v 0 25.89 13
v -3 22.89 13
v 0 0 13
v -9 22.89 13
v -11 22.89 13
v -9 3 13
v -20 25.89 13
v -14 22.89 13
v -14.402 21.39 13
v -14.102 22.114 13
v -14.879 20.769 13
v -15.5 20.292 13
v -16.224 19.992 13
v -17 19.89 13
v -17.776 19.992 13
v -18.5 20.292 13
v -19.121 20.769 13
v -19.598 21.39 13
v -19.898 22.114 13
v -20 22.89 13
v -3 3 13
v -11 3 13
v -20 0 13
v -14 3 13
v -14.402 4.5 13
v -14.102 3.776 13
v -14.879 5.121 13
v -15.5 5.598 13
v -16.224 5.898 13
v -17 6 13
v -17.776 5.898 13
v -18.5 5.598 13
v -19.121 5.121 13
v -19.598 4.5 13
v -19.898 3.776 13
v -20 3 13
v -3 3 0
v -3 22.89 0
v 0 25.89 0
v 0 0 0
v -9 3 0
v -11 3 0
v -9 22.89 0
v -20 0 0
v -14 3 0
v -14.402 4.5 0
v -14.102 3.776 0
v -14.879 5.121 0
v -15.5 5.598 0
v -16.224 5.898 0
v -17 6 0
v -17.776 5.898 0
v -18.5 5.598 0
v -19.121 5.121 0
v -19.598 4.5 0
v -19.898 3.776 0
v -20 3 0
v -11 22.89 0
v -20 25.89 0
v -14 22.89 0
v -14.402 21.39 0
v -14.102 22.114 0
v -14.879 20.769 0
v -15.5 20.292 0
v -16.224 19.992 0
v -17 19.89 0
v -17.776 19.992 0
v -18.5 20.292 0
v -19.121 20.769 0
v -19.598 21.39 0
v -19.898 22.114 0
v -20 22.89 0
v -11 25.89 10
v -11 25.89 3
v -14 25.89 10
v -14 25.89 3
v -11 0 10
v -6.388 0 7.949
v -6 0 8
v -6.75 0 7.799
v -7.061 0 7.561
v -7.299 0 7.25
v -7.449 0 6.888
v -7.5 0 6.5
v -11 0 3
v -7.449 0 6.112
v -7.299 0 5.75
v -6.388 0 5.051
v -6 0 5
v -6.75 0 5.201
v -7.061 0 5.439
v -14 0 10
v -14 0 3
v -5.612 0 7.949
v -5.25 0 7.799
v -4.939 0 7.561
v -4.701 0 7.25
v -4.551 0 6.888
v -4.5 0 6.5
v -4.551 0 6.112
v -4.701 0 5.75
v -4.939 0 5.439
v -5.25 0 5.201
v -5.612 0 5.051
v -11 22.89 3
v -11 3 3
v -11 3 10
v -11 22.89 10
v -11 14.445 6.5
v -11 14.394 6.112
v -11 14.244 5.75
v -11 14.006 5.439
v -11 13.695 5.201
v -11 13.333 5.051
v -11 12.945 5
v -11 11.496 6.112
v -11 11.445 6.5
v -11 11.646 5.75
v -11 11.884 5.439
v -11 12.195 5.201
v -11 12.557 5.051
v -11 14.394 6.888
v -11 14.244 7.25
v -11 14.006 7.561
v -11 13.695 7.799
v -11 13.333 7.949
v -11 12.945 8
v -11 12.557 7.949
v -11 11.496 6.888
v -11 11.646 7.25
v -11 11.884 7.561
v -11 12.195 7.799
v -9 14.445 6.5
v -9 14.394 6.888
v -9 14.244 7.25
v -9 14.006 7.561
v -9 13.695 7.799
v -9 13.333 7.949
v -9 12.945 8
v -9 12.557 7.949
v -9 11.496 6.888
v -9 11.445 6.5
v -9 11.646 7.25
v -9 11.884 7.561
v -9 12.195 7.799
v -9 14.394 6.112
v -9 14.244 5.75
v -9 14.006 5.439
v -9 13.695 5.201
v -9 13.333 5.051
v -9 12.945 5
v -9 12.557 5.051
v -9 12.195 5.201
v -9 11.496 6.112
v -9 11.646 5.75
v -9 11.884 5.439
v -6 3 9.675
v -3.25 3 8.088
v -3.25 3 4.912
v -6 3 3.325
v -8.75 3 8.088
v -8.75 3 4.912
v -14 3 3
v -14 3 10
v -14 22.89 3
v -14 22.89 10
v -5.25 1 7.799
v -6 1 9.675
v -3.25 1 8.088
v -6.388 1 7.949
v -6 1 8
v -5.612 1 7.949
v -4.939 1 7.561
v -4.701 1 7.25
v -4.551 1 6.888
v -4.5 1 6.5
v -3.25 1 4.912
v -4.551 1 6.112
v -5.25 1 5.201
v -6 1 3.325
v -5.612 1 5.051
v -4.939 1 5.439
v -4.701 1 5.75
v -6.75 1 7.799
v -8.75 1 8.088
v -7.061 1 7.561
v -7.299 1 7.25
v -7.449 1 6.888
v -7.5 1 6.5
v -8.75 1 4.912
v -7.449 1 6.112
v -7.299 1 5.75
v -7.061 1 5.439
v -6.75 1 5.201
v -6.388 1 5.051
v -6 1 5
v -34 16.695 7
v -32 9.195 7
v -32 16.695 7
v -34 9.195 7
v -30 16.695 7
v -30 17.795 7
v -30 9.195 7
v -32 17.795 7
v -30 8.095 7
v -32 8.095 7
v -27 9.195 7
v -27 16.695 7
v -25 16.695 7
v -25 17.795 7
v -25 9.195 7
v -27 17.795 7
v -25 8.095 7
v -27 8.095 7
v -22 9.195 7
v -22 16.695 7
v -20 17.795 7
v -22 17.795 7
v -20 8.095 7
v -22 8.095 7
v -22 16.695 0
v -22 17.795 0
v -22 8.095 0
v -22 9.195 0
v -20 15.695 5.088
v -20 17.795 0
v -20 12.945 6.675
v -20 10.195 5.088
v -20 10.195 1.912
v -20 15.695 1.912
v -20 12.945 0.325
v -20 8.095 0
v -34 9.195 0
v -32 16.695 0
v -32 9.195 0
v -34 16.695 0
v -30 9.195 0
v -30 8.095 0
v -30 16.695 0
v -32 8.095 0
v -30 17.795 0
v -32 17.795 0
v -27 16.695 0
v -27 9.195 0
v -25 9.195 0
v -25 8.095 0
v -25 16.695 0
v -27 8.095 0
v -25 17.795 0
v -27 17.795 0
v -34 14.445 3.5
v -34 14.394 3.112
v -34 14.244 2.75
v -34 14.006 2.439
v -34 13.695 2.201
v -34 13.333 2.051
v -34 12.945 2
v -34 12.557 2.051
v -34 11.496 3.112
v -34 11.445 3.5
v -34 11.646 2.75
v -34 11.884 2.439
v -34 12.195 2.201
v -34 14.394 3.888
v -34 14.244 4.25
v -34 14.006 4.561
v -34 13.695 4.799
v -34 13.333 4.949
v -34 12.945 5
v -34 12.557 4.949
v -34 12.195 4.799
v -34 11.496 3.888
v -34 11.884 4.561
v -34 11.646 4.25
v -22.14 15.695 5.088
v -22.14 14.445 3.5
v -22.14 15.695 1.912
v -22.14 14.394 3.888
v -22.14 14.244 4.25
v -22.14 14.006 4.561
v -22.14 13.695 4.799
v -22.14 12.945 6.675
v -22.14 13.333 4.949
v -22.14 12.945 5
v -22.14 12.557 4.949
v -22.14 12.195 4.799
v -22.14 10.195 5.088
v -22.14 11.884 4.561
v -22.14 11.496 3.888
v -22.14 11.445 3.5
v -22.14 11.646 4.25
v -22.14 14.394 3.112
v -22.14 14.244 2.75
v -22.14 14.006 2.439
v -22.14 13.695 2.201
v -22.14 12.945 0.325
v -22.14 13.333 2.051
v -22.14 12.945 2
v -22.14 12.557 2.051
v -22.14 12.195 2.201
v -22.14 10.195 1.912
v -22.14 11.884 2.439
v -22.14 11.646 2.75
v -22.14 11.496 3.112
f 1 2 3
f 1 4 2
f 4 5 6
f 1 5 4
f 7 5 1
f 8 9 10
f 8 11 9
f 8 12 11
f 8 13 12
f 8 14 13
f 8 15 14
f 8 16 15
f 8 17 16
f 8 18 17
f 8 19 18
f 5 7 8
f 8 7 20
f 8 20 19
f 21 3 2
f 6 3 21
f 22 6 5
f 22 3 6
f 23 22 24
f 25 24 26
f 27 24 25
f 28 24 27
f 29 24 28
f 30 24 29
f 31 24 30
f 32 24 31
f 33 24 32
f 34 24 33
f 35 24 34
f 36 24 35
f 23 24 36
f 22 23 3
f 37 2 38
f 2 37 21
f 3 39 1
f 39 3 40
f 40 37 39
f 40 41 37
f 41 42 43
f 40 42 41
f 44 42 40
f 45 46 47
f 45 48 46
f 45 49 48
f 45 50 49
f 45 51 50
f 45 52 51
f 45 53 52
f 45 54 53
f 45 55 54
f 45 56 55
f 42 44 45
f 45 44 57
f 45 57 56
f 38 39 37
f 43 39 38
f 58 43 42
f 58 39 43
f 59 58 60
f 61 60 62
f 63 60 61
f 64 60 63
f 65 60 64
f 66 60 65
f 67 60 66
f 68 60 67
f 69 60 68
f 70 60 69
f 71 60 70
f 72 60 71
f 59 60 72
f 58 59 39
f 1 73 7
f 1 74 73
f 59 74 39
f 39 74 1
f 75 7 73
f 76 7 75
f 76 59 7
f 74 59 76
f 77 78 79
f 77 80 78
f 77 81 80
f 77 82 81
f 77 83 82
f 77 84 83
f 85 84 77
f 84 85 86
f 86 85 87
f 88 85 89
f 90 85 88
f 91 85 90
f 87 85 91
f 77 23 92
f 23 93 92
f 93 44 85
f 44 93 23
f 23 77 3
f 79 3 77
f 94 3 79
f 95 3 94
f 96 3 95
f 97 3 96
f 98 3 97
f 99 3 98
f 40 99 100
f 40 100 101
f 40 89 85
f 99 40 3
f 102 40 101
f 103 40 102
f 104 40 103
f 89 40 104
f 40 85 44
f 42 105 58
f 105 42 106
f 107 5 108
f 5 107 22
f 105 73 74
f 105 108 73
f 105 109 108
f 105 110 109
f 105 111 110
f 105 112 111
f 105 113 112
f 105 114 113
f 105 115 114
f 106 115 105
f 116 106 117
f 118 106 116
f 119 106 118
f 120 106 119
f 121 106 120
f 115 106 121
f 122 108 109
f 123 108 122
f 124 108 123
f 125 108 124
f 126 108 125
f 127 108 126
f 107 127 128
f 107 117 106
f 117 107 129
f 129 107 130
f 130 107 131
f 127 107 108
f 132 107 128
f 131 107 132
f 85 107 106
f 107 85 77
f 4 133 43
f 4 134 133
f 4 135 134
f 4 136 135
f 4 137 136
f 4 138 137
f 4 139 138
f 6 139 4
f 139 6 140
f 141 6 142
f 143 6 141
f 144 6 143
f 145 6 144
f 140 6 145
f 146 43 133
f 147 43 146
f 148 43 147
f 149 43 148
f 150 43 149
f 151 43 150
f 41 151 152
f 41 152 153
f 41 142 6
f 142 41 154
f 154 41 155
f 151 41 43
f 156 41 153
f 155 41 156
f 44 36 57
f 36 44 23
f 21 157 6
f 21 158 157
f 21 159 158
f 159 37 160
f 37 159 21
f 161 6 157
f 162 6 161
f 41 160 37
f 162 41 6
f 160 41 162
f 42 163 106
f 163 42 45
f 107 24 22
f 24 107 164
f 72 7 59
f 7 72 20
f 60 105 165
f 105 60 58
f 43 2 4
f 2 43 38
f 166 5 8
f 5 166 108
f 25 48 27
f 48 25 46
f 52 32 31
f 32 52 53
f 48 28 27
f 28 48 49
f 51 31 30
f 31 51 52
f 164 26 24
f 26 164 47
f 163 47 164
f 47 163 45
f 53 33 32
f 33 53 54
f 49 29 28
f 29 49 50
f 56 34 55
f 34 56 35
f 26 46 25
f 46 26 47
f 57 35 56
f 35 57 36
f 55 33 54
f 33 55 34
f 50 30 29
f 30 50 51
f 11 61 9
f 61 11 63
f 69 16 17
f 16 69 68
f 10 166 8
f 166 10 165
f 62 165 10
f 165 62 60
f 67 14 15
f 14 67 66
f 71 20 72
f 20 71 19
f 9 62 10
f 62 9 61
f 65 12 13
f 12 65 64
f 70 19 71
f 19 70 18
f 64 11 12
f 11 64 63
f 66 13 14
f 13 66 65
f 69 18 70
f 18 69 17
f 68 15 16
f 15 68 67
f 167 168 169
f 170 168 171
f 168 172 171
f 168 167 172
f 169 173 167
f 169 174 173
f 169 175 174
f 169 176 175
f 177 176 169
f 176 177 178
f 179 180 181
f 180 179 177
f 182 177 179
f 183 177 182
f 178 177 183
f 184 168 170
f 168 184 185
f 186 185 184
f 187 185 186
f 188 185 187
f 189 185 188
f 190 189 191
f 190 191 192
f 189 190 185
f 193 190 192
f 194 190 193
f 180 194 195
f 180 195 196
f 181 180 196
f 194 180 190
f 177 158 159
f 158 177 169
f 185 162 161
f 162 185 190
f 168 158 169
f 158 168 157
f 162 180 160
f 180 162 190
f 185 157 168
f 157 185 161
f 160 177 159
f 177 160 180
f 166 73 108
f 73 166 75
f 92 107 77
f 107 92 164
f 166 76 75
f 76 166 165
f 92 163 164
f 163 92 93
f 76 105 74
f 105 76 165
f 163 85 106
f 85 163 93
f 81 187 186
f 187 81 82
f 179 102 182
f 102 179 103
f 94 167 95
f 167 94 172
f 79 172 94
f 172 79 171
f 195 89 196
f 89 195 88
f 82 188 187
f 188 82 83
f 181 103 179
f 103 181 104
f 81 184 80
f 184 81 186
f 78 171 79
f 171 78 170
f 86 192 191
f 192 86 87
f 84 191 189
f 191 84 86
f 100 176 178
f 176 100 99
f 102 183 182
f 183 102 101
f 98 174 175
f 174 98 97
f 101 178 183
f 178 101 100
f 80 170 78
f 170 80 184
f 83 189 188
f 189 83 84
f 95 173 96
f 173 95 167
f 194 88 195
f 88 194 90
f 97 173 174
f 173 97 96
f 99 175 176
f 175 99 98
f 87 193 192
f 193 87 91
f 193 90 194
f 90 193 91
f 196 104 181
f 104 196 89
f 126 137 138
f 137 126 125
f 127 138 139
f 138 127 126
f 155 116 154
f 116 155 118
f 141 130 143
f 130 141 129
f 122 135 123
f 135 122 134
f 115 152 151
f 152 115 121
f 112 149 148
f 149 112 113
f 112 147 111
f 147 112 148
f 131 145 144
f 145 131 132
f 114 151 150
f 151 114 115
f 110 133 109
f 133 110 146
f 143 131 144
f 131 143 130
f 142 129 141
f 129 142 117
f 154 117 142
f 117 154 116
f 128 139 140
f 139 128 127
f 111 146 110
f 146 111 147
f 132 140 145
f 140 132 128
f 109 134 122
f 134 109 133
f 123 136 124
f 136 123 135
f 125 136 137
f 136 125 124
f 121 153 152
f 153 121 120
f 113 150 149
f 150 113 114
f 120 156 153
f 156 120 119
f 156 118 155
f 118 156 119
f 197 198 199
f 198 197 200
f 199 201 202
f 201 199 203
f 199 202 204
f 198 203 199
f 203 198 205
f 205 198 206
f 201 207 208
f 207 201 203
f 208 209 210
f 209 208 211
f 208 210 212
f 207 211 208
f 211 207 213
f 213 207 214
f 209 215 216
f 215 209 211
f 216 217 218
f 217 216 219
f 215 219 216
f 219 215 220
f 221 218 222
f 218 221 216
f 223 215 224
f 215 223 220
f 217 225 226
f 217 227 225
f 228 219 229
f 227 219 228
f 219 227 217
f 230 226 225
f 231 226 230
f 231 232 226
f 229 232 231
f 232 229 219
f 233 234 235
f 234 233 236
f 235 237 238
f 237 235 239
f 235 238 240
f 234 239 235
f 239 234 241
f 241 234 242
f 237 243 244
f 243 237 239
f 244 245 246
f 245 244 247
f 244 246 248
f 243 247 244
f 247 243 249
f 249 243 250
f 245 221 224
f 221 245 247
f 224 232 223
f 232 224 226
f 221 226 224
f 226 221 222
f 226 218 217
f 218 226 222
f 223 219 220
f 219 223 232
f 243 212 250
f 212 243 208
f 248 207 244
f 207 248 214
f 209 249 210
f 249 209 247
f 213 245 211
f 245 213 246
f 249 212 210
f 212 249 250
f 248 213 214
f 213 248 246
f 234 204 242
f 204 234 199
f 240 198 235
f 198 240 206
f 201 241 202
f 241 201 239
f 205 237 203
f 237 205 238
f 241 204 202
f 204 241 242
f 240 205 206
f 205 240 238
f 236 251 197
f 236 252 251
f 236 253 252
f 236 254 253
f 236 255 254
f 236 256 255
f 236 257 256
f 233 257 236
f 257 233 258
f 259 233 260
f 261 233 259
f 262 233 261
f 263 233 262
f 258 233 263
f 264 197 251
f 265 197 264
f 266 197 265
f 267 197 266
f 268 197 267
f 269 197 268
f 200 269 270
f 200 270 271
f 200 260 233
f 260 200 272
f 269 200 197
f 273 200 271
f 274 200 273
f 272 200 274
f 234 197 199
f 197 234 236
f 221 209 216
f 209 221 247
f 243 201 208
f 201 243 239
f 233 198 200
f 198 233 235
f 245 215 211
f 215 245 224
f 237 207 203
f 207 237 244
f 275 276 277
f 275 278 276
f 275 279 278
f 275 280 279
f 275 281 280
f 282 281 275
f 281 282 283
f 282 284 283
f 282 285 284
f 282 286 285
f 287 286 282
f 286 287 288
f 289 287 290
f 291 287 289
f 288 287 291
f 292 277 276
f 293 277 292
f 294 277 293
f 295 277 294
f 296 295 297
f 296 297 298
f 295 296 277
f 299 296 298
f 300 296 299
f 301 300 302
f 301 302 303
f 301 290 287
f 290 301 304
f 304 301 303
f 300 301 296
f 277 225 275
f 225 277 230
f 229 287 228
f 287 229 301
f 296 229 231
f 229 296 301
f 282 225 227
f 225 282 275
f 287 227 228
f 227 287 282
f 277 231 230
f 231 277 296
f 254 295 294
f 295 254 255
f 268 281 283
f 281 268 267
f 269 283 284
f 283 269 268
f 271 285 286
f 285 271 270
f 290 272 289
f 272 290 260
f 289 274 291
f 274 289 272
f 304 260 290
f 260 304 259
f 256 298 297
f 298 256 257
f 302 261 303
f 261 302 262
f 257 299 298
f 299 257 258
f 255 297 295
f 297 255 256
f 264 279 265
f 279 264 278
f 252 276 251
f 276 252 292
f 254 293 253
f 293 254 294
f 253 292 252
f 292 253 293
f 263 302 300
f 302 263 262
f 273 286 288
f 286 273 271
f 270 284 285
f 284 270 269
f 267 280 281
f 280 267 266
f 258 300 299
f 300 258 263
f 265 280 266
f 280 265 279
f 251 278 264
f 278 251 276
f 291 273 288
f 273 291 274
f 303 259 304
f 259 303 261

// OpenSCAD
// author: clayb.rpi@gmail.com
// date: 2013-02-20
// units: mm
//
// description: A X-axis tensioner for the original printed printrbot.
//
// extra hardware needed:
//   - 2 M4 machine screws + nuts (JIS)
//   - 1 small ziptie

/*******************
 * measured values *
 *******************/

// How wide the belt is
BELT_WIDTH = 7;

// The thickness of the belt.
BELT_THICKNESS = 3;

// The depth of the gaps in the belt.
BELT_GAP_DEPTH = 1.1;

// The width of the gaps in the belt.
BELT_GAP_WIDTH = 2;

// The distance between repeated features in the belt.
BELT_GAP_SPACING = 5;

// How wide the mounting point is.
MOUNT_WIDTH = 17.75;

// How deep the mounting point is (only used for visualization).
MOUNT_DEPTH = 20;

// How high the mounting point is.
MOUNT_HEIGHT = 6;

// The side-size of the inner mounting point sqare (only used for visualization).
MOUNT_INNER_SQUARE = 7;

// How thick the walls should be.
WALL_THICKNESS = 3;

// How thick any bracing walls should be.
THIN_WALL_THICKNESS = 2;

// The diameter of the screws to be used.
SCREW_HOLE_DIAMETER= 3;

// The width of the nuts to be used as measured from flat sides.
NUT_SHORT_WIDTH = 5.5;

// The height of the nuts to be used.
NUT_HEIGHT = 2.14;


/*********************
 * calculated values *
 *********************/
$fn=24 + 0;

TOP_PART_WIDTH = max(NUT_SHORT_WIDTH + THIN_WALL_THICKNESS, WALL_THICKNESS);
TOP_PART_HEIGHT = 2 * BELT_WIDTH;

BOTTOM_HEIGHT = MOUNT_HEIGHT + BELT_THICKNESS + 3 * WALL_THICKNESS + THIN_WALL_THICKNESS;
BOTTOM_WIDTH = max(
    /* mount is the limiting factor */ MOUNT_WIDTH + 2 * WALL_THICKNESS + NUT_HEIGHT,
    /* if we have thick belts */ TOP_PART_WIDTH + 2 * BELT_THICKNESS + 4 * WALL_THICKNESS);
BOTTOM_DEPTH = BELT_WIDTH + 2 * WALL_THICKNESS;


/*
 * A small piece to actually grip the belt for tensioning.
 */
module top_piece() {
  difference() {
    union() {
      cube([BELT_WIDTH, TOP_PART_WIDTH, TOP_PART_HEIGHT]);
      for (h = [0 : BELT_GAP_SPACING : 2 * BELT_WIDTH - BELT_GAP_WIDTH]) {
        translate([0, -BELT_GAP_DEPTH, h])
        cube([BELT_WIDTH, TOP_PART_WIDTH + 2 * BELT_GAP_DEPTH, BELT_GAP_WIDTH]);
      }
    }

    // cut out slots for the tensioner nut and screw.
    translate([BELT_WIDTH / 2, TOP_PART_WIDTH / 2, -1])
    nut_hole(h = NUT_HEIGHT + 1);

    translate([BELT_WIDTH / 2, TOP_PART_WIDTH / 2, -1])
    cylinder(r = SCREW_HOLE_DIAMETER / 2, h = TOP_PART_HEIGHT + 2);
  }
}

/*
 * The bottom bracket piece of the tensioner.
 */
module bottom_piece() {
  difference() {
    union() {
      // bottom side.
      cube([BOTTOM_DEPTH, BOTTOM_WIDTH, WALL_THICKNESS]);

      // support beam.
      translate([0, 0, WALL_THICKNESS + MOUNT_HEIGHT])
      cube([BOTTOM_DEPTH, BOTTOM_WIDTH, THIN_WALL_THICKNESS]);

      // fill in the area around the mounting point.
      if (BOTTOM_WIDTH - 2 * WALL_THICKNESS - MOUNT_WIDTH -0.001 > NUT_HEIGHT) {
        translate([0, WALL_THICKNESS + NUT_HEIGHT + MOUNT_WIDTH, WALL_THICKNESS])
        cube([BOTTOM_DEPTH, BOTTOM_WIDTH - 2 * WALL_THICKNESS - MOUNT_WIDTH - NUT_HEIGHT, MOUNT_HEIGHT]);
      }

      // sides.
      cube([BOTTOM_DEPTH, WALL_THICKNESS, BOTTOM_HEIGHT]);

      translate([0, BOTTOM_WIDTH - WALL_THICKNESS])
      cube([BOTTOM_DEPTH, WALL_THICKNESS, BOTTOM_HEIGHT]);

      // Rounded areas for the bet interface.
      translate([0, WALL_THICKNESS, BOTTOM_HEIGHT - WALL_THICKNESS])
      rotate([0, 90, 0])
      cylinder(r=WALL_THICKNESS, h=BOTTOM_DEPTH);

      translate([0, BOTTOM_WIDTH - WALL_THICKNESS, BOTTOM_HEIGHT - WALL_THICKNESS])
      rotate([0, 90, 0])
      cylinder(r=WALL_THICKNESS, h=BOTTOM_DEPTH);
    }

    // cut out a hole for the belt.
    translate([WALL_THICKNESS, -1, WALL_THICKNESS + MOUNT_HEIGHT + THIN_WALL_THICKNESS])
    cube([BELT_WIDTH, BOTTOM_WIDTH + 2, BELT_THICKNESS]);

    // cut out a hole for the bracing screw.
    translate([BOTTOM_DEPTH / 2, -1, WALL_THICKNESS + MOUNT_HEIGHT / 2])
    rotate([-90, 0, 0])
    cylinder(r=SCREW_HOLE_DIAMETER / 2, h=WALL_THICKNESS + 2);

    translate([BOTTOM_DEPTH / 2, WALL_THICKNESS - THIN_WALL_THICKNESS, WALL_THICKNESS + MOUNT_HEIGHT / 2])
    rotate([-90, 0, 0])
    nut_hole(h=2 * NUT_HEIGHT);

    // cut out a hole for the tensioning screw.
    translate([BOTTOM_DEPTH / 2, BOTTOM_WIDTH / 2, WALL_THICKNESS + MOUNT_HEIGHT - 1])
    cylinder(r=SCREW_HOLE_DIAMETER / 2, h=THIN_WALL_THICKNESS + 2);
  }
}

/*
 * A representation of the mounting point on the printrbot for this part.
 */
module mounting_point() {
  difference() {
  	cube([MOUNT_DEPTH, MOUNT_WIDTH, MOUNT_HEIGHT]);

    translate([MOUNT_DEPTH - MOUNT_INNER_SQUARE - 6, (MOUNT_WIDTH - MOUNT_INNER_SQUARE) / 2, -1])
    cube([MOUNT_INNER_SQUARE, MOUNT_INNER_SQUARE, MOUNT_HEIGHT +  2]);
  }
}

/*
 * A cutaway for a nut as measured from the flat sides.
 */
module nut_hole(short_width=NUT_SHORT_WIDTH, h=NUT_HEIGHT) {
  translate([0, 0, h / 2])
  union() {
    for(r = [0, 120, 240]) {
      rotate([0, 0, r])
      cube([(short_width / 2) / cos(30), short_width, h], center=true);
    }
  }
}

/*
 * A module to render all of the pieces in their assembled form.
 */
module pieces_arranged_for_display() {
  bottom_piece();

  translate([WALL_THICKNESS, (BOTTOM_WIDTH - TOP_PART_WIDTH) / 2,
             WALL_THICKNESS + MOUNT_HEIGHT + THIN_WALL_THICKNESS + BELT_THICKNESS])
  top_piece();

  %
  // Visualize the mounting point on the printrbot.
  translate([BOTTOM_DEPTH - MOUNT_DEPTH, WALL_THICKNESS + NUT_HEIGHT, WALL_THICKNESS])
  mounting_point();
}

/*
 * A module to render all of the pieces in their printable form.
 */
module pieces_arranged_for_printing() {
  rotate([0, -90, 0])
  bottom_piece();

  translate([-BOTTOM_HEIGHT, (BOTTOM_WIDTH - TOP_PART_WIDTH) / 2, 0])
  rotate([0, -90, 0])
  top_piece();
}

// pieces_arranged_for_display();
pieces_arranged_for_printing();
